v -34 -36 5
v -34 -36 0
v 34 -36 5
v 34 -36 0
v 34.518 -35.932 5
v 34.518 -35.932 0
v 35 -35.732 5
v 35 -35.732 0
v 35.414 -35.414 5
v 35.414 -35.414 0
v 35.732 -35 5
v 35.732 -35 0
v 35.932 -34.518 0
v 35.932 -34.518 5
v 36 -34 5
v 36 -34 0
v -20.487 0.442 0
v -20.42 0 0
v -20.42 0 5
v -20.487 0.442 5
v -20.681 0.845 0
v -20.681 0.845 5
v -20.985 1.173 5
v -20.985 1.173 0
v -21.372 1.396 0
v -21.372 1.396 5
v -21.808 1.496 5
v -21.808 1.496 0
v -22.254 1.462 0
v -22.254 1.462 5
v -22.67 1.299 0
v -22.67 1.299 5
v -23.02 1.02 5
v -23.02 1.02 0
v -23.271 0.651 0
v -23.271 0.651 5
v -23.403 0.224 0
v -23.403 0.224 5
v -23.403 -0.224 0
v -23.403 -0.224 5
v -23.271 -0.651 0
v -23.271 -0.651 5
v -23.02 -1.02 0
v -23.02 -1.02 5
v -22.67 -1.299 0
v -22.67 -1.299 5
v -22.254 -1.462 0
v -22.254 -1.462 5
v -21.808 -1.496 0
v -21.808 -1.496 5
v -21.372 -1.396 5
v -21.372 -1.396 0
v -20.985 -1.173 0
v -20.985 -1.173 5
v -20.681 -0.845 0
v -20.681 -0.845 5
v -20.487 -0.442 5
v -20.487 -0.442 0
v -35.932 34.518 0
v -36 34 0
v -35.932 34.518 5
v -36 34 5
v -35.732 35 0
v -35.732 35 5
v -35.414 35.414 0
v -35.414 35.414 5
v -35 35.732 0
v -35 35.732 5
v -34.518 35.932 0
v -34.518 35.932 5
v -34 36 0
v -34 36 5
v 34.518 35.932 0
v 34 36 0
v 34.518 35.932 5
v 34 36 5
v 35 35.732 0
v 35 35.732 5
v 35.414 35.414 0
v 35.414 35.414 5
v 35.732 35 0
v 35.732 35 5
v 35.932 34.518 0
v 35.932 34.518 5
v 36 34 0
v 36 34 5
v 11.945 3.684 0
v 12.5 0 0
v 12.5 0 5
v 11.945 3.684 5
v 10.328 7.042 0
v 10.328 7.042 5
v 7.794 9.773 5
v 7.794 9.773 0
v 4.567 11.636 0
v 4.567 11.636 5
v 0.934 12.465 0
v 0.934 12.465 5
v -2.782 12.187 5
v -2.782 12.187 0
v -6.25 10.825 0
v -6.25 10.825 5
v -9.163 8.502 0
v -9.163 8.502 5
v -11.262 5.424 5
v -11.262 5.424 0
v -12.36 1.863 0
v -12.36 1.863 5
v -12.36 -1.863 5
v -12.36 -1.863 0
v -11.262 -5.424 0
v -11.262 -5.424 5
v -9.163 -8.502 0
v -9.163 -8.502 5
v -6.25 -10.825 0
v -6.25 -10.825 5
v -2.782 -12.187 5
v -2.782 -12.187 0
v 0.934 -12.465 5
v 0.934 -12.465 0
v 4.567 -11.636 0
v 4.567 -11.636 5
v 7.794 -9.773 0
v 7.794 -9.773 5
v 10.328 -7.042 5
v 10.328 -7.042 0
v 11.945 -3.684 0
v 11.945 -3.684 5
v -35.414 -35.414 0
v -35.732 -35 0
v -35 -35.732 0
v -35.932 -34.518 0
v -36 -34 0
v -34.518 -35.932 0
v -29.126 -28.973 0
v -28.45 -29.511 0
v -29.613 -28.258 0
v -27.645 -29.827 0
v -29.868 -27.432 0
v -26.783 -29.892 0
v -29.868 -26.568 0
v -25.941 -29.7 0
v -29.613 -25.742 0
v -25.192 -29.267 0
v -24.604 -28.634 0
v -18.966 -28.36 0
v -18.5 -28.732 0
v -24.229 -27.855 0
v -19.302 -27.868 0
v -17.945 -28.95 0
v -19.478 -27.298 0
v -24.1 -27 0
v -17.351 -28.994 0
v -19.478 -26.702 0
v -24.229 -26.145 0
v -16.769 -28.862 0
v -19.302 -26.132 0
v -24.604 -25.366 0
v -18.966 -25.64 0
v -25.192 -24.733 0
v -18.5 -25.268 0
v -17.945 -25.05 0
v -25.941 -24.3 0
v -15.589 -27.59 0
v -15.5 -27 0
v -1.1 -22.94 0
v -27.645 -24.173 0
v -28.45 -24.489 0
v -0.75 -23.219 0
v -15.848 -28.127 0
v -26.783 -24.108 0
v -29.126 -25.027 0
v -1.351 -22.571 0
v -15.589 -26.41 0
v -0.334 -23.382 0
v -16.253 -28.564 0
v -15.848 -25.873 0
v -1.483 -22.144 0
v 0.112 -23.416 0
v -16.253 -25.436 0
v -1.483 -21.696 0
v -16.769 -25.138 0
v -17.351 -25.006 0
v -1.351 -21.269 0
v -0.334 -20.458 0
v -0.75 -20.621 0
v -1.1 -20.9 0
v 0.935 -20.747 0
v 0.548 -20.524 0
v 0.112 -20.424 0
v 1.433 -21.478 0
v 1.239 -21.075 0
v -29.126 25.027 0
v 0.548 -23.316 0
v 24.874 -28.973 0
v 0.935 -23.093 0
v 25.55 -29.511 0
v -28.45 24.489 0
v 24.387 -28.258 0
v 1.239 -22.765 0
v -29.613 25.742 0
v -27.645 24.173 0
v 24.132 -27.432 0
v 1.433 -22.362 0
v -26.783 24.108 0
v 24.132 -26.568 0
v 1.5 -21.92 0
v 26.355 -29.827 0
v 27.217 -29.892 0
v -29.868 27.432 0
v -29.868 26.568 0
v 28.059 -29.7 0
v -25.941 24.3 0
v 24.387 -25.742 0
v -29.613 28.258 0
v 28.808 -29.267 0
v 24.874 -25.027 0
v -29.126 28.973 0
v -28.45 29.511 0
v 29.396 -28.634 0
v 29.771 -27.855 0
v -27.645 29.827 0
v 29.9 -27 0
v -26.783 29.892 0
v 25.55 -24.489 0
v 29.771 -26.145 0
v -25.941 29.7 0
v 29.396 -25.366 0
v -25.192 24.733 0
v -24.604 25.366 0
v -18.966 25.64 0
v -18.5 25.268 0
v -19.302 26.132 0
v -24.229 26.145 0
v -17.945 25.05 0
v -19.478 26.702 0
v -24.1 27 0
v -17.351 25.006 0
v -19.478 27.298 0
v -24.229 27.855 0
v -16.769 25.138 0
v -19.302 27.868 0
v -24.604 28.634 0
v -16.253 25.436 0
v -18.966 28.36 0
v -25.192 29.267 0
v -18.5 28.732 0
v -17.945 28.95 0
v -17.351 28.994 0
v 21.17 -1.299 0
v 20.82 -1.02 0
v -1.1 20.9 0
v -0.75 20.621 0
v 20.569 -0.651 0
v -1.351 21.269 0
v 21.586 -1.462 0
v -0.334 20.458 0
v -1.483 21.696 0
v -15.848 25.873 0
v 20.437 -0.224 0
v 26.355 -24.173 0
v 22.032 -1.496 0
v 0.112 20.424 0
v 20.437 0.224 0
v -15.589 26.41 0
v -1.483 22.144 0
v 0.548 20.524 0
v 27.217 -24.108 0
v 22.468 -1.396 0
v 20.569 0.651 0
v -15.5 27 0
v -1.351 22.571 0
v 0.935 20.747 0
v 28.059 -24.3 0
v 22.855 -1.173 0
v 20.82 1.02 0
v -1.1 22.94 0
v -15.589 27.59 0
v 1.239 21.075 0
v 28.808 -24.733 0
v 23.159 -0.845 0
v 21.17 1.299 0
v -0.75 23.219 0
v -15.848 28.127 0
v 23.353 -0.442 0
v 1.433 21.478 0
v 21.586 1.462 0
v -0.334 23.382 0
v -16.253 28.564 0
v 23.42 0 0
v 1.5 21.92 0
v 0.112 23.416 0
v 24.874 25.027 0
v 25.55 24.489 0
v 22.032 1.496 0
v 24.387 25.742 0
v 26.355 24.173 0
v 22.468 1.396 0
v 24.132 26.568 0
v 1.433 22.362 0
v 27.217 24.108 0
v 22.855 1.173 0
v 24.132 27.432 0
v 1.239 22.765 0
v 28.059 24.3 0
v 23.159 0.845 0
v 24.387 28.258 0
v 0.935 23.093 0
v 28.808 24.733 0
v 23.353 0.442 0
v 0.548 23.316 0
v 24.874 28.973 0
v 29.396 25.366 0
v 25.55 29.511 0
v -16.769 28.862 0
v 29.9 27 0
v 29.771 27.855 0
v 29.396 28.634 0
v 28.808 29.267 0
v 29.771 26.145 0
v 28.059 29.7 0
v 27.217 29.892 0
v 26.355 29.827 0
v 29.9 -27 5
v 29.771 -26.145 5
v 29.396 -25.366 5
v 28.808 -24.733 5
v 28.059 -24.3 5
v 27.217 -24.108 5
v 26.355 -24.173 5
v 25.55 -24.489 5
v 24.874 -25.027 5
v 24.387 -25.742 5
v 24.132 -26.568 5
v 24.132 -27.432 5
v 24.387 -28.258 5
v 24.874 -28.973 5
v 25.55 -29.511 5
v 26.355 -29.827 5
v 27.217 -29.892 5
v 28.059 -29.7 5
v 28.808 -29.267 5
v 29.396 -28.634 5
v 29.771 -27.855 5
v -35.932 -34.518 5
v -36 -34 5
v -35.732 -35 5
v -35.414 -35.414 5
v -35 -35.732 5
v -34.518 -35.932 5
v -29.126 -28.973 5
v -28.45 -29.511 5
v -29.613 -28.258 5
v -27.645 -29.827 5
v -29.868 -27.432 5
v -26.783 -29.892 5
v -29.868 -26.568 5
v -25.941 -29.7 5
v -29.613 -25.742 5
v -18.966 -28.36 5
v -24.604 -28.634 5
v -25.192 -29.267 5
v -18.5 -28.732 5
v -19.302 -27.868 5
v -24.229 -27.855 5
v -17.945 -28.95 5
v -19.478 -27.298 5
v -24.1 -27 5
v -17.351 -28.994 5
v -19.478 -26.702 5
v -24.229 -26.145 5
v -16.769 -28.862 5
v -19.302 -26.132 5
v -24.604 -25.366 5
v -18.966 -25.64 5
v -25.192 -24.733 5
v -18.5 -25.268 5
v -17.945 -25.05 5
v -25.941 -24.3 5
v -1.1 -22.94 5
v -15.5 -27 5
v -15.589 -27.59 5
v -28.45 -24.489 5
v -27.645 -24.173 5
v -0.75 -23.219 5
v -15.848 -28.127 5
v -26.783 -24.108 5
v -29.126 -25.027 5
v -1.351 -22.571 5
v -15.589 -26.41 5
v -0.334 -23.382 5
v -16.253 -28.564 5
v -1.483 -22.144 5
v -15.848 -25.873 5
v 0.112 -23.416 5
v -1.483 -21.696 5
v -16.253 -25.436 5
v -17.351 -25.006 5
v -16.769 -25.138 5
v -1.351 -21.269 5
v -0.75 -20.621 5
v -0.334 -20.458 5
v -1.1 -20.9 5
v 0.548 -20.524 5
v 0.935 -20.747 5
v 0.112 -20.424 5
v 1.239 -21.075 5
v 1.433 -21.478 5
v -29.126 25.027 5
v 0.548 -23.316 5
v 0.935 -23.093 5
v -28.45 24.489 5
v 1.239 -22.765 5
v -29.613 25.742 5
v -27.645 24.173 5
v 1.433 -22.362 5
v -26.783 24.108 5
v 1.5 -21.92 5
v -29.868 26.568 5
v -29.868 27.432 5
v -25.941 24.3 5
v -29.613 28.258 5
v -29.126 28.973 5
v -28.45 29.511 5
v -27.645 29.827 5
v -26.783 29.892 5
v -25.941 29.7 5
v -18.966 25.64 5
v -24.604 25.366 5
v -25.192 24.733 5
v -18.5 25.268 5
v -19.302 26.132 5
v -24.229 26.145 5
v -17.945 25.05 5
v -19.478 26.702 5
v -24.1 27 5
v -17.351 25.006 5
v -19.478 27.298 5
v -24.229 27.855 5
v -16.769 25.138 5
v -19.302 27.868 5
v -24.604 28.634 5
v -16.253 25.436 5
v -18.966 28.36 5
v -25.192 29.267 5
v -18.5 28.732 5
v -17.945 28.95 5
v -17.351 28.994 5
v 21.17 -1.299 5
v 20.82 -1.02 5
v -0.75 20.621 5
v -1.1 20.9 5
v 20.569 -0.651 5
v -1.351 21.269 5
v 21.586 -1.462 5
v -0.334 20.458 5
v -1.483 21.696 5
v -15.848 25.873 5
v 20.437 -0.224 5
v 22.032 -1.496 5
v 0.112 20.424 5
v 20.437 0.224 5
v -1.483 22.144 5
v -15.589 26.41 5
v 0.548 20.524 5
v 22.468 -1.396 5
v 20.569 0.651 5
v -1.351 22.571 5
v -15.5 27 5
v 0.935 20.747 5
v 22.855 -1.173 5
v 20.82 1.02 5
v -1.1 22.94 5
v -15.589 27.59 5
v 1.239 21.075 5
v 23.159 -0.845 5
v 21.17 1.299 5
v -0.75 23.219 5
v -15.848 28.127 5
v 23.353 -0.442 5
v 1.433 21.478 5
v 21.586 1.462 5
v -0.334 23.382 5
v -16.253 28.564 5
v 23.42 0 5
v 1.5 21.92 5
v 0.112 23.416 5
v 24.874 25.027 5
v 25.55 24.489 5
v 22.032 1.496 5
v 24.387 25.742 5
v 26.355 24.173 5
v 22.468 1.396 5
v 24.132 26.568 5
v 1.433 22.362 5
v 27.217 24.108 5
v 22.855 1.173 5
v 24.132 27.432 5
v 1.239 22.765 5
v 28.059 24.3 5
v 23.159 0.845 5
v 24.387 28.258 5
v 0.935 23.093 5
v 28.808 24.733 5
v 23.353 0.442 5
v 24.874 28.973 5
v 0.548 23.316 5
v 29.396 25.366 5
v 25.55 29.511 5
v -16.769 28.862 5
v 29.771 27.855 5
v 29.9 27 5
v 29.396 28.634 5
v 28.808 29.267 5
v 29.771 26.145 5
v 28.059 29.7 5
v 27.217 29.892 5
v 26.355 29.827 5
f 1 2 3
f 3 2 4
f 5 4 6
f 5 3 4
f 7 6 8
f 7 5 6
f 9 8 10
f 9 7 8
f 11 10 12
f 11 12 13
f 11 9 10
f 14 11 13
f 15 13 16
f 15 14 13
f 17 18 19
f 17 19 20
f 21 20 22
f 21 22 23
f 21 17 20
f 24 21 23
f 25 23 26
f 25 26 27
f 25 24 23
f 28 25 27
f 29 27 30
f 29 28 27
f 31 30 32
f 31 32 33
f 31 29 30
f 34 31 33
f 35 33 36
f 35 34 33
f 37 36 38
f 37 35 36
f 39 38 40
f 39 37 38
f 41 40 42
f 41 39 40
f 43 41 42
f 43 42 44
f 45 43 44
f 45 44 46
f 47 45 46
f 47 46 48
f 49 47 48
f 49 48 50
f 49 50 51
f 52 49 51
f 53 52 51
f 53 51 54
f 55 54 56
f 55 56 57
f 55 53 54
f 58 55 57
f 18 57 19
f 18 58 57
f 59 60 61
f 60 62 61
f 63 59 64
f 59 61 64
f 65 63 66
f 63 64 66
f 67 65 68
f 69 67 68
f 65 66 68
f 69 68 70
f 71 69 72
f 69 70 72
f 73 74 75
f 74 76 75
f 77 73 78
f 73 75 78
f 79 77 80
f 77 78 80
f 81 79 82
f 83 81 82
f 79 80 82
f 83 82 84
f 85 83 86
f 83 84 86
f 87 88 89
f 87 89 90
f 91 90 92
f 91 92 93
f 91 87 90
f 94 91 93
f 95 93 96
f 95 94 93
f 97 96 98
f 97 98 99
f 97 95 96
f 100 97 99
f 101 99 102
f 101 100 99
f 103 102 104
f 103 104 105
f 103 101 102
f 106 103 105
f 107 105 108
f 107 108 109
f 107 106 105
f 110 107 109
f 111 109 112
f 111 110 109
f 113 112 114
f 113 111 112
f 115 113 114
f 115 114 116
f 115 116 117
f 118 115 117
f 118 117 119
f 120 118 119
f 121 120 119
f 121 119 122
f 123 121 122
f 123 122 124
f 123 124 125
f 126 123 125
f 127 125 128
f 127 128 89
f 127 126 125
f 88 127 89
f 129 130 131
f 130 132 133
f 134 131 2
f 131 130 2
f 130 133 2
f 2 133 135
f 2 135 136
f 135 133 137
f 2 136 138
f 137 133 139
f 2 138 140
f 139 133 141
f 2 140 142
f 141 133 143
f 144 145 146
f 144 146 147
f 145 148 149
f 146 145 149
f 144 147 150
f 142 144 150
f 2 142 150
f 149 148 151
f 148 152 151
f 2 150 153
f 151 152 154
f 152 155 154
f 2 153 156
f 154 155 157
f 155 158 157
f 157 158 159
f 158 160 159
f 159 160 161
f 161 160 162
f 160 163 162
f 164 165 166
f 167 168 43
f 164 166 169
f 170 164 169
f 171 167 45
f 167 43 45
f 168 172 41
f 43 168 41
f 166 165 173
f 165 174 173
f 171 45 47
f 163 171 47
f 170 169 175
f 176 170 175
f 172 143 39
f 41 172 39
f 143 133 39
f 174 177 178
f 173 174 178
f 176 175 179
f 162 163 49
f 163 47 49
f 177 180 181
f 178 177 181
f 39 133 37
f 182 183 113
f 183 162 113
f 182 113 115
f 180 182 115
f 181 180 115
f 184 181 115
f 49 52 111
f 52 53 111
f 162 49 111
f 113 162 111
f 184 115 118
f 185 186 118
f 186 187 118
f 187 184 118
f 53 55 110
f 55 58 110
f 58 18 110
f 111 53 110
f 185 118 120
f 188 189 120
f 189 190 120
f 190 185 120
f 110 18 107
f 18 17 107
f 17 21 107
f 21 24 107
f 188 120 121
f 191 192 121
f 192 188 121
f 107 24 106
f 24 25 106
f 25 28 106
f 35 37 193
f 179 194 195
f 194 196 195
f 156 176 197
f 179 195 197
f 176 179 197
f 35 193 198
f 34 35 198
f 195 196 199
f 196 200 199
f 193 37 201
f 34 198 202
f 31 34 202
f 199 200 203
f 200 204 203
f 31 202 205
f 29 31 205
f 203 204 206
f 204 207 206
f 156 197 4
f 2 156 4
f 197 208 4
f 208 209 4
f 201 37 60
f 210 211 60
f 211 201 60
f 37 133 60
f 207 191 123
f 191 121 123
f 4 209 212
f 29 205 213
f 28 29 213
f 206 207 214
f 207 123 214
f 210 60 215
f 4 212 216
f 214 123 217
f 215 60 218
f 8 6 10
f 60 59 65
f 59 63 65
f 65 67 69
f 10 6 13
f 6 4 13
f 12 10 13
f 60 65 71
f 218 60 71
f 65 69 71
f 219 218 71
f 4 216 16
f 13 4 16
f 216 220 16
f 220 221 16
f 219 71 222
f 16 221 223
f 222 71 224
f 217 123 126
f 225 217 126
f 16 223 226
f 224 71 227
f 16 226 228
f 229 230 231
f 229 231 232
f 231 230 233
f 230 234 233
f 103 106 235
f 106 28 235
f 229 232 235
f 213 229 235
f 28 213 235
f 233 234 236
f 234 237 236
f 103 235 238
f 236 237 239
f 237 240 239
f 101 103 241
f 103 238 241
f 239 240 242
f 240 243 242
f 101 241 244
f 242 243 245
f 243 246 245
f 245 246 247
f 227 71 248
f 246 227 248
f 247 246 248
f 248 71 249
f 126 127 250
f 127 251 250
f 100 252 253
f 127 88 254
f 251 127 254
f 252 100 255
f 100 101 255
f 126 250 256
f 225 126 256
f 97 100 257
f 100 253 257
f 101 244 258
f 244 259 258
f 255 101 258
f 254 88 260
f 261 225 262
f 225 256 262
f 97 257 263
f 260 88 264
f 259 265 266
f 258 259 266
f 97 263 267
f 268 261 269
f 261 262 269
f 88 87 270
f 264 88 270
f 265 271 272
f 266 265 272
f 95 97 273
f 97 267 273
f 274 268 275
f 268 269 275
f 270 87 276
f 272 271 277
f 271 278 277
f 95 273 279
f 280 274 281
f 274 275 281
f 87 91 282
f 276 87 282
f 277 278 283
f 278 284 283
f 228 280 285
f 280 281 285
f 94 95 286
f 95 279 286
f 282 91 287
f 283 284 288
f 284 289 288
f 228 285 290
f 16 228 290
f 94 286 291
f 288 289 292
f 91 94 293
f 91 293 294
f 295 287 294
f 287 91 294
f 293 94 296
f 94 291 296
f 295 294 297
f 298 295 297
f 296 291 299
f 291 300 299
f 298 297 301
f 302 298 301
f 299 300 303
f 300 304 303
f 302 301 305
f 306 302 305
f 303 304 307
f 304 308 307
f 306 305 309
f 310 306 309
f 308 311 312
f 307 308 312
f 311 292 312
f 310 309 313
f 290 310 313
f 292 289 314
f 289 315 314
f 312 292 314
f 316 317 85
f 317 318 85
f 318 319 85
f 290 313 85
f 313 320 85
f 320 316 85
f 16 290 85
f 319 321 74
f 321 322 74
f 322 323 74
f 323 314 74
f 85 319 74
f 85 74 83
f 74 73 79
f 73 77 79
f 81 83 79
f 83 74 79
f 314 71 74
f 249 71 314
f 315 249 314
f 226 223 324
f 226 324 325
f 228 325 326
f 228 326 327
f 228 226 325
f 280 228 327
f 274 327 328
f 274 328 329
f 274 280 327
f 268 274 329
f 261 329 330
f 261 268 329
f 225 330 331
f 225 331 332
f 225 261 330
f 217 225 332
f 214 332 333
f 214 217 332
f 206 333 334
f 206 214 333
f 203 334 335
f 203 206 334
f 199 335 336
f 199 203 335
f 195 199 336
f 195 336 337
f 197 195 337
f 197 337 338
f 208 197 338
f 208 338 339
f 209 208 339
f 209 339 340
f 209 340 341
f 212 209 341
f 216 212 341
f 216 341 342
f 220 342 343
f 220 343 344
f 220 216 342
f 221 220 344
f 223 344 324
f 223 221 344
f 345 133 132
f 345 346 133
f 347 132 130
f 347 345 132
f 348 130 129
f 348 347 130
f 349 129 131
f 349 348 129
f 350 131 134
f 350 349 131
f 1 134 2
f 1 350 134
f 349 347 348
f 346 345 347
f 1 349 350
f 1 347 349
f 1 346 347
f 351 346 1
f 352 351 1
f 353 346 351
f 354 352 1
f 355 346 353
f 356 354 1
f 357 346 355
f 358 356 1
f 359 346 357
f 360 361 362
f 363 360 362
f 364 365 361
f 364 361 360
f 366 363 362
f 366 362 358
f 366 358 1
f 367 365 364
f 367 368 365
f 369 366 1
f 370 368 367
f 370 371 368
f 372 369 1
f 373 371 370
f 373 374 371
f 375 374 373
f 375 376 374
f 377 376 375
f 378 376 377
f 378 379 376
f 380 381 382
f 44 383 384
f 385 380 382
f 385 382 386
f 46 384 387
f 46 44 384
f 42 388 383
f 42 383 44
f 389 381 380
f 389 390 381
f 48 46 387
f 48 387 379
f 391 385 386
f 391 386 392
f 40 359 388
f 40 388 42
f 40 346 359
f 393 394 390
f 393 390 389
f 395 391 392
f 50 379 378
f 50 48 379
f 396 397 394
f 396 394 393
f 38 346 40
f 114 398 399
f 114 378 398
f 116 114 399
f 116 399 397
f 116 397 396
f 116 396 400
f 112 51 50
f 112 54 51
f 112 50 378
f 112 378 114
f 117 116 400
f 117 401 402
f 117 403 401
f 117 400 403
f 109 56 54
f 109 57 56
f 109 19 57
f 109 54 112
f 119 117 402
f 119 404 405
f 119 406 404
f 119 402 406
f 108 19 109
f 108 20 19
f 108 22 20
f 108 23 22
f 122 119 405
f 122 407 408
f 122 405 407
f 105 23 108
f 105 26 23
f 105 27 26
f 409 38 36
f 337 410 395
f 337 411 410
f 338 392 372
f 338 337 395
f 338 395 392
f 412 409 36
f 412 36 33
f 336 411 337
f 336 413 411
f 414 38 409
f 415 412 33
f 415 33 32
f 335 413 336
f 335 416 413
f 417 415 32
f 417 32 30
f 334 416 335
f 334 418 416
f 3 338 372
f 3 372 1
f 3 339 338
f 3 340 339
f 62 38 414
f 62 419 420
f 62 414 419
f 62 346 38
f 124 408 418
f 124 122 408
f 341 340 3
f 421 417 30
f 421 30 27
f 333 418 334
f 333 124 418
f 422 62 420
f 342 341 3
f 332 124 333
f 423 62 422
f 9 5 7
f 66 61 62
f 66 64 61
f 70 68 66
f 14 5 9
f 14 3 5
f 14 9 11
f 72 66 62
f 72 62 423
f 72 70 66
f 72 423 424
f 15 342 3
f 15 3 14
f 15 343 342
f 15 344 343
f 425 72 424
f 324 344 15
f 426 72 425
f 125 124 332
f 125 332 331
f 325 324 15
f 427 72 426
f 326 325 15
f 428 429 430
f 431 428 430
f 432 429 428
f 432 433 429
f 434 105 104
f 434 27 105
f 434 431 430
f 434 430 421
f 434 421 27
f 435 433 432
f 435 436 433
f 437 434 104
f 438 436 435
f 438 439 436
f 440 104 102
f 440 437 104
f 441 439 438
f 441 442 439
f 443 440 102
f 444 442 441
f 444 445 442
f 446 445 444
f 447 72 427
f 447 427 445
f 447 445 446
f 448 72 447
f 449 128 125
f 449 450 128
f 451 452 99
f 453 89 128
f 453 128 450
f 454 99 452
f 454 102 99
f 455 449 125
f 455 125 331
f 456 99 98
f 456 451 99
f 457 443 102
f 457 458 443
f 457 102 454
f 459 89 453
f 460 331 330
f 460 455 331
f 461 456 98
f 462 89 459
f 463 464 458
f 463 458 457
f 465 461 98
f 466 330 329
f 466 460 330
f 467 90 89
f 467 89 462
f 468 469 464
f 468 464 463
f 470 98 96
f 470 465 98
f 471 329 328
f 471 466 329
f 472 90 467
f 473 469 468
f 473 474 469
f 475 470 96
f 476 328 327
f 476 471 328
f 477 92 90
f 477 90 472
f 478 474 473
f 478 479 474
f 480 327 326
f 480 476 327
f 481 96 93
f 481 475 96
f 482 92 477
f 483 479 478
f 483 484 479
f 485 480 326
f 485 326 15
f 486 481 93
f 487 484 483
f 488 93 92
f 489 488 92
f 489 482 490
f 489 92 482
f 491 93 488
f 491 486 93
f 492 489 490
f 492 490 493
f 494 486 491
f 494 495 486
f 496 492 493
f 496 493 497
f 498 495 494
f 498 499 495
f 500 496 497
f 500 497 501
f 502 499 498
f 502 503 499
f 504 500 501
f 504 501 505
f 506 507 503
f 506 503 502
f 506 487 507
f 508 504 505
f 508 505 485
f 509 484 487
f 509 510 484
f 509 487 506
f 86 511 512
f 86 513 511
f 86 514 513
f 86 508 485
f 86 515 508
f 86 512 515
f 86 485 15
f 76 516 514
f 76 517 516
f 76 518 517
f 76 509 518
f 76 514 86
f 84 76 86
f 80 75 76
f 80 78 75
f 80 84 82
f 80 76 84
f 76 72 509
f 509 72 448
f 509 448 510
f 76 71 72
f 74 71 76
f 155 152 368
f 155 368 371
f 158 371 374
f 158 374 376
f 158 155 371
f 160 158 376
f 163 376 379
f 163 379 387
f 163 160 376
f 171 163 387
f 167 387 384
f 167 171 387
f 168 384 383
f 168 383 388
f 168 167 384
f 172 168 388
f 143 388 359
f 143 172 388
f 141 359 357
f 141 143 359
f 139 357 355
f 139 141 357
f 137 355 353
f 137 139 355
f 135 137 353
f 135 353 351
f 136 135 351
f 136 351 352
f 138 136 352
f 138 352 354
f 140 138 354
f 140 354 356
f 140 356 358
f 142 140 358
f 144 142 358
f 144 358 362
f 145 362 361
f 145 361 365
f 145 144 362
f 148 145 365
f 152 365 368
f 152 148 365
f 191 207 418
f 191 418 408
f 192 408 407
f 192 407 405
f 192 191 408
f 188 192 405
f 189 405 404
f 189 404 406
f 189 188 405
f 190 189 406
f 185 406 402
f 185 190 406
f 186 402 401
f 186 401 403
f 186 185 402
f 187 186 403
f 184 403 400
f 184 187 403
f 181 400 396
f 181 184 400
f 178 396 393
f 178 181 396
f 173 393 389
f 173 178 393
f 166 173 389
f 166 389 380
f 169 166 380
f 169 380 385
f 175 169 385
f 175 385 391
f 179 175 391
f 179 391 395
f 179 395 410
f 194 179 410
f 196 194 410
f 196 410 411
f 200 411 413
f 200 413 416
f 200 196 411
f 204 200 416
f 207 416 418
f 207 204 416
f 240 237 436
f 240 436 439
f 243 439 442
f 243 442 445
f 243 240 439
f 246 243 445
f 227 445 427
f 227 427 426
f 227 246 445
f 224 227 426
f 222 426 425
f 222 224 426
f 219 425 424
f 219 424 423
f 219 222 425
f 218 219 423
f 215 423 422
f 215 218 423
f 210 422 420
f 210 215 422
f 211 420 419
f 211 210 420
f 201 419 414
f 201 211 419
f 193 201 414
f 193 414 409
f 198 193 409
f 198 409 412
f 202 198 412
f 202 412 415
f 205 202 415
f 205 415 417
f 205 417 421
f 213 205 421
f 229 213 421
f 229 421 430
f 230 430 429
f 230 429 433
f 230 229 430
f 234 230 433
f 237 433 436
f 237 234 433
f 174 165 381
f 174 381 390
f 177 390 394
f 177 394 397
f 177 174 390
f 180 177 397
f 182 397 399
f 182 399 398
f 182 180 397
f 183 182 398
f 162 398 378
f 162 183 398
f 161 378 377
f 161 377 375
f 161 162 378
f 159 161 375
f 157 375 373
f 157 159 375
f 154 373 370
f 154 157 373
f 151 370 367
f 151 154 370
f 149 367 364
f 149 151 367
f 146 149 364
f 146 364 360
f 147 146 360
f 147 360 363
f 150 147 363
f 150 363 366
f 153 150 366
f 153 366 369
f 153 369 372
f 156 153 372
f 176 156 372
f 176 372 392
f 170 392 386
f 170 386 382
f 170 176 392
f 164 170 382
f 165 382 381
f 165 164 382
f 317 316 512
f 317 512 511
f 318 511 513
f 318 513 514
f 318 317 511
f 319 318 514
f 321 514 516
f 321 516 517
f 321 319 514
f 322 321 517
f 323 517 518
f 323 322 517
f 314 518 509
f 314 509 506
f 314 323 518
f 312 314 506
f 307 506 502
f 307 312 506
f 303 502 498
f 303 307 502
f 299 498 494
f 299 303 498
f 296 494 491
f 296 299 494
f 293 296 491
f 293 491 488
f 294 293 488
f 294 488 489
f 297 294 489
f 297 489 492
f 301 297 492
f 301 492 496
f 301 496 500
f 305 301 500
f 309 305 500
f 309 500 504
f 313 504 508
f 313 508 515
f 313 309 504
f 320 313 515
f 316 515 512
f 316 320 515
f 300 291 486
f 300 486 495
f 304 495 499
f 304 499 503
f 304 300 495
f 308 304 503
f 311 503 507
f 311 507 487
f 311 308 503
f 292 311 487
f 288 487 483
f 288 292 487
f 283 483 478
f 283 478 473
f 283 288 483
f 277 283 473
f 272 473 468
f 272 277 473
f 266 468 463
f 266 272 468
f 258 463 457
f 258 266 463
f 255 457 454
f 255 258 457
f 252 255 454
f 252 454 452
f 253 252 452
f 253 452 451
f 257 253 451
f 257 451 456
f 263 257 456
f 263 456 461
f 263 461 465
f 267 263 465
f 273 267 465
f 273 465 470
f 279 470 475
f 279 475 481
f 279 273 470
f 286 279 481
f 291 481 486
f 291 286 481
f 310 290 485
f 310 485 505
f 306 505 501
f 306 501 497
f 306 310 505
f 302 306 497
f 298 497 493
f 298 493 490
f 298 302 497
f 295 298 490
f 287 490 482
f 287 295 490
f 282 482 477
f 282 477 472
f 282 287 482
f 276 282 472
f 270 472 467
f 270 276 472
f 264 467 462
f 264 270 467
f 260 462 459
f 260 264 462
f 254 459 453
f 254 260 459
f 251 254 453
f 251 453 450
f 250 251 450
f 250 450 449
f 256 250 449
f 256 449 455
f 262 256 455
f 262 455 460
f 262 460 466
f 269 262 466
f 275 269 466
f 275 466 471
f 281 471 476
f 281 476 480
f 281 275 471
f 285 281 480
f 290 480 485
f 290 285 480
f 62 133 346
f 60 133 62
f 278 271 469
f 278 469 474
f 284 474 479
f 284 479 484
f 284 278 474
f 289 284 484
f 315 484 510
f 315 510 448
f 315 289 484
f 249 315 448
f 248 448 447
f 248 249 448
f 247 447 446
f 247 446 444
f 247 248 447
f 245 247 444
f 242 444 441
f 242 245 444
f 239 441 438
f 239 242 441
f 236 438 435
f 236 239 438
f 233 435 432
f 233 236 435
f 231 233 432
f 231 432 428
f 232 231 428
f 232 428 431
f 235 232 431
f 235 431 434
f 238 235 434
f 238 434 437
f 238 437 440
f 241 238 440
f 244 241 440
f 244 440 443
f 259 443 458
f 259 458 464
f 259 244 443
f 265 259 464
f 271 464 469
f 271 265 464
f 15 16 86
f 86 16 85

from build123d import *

# Parameters (mm, degrees)
SKETCH1_W           = 72
SKETCH1_H           = 72
SKETCH1_R           = 2.9
SKETCH1_R_2         = 12.5
SKETCH1_R_3         = 1.5
SKETCH1_R_4         = 2
BOSS_EXTRUDE1_DEPTH = 5
FILLET1_R           = 2


with BuildPart() as part:
    # Sketch1 → Boss-Extrude1 (new body)
    with BuildSketch(Plane.XY):
        Rectangle(SKETCH1_W, SKETCH1_H)
        with Locations((-27, 27)):
            Circle(SKETCH1_R, mode=Mode.SUBTRACT)
        with Locations((27, 27)):
            Circle(SKETCH1_R, mode=Mode.SUBTRACT)
        with Locations((27, -27)):
            Circle(SKETCH1_R, mode=Mode.SUBTRACT)
        with Locations((-27, -27)):
            Circle(SKETCH1_R, mode=Mode.SUBTRACT)
        Circle(SKETCH1_R_2, mode=Mode.SUBTRACT)
        with Locations((0, 21.92)):
            Circle(SKETCH1_R_3, mode=Mode.SUBTRACT)
        with Locations((0, -21.92)):
            Circle(SKETCH1_R_3, mode=Mode.SUBTRACT)
        with Locations((-21.92, 0)):
            Circle(SKETCH1_R_3, mode=Mode.SUBTRACT)
        with Locations((21.92, 0)):
            Circle(SKETCH1_R_3, mode=Mode.SUBTRACT)
        with Locations((-17.5, 27)):
            Circle(SKETCH1_R_4, mode=Mode.SUBTRACT)
        with Locations((-17.5, -27)):
            Circle(SKETCH1_R_4, mode=Mode.SUBTRACT)
    extrude(amount=BOSS_EXTRUDE1_DEPTH)

    # Fillet1
    fillet1_edges = [part.edges().sort_by_distance(p)[0] for p in [
        (-36, 36, 2.5),
        (36, 36, 2.5),
        (36, -36, 2.5),
        (-36, -36, 2.5),
    ]]
    fillet(fillet1_edges, radius=FILLET1_R)


solid = part.part
